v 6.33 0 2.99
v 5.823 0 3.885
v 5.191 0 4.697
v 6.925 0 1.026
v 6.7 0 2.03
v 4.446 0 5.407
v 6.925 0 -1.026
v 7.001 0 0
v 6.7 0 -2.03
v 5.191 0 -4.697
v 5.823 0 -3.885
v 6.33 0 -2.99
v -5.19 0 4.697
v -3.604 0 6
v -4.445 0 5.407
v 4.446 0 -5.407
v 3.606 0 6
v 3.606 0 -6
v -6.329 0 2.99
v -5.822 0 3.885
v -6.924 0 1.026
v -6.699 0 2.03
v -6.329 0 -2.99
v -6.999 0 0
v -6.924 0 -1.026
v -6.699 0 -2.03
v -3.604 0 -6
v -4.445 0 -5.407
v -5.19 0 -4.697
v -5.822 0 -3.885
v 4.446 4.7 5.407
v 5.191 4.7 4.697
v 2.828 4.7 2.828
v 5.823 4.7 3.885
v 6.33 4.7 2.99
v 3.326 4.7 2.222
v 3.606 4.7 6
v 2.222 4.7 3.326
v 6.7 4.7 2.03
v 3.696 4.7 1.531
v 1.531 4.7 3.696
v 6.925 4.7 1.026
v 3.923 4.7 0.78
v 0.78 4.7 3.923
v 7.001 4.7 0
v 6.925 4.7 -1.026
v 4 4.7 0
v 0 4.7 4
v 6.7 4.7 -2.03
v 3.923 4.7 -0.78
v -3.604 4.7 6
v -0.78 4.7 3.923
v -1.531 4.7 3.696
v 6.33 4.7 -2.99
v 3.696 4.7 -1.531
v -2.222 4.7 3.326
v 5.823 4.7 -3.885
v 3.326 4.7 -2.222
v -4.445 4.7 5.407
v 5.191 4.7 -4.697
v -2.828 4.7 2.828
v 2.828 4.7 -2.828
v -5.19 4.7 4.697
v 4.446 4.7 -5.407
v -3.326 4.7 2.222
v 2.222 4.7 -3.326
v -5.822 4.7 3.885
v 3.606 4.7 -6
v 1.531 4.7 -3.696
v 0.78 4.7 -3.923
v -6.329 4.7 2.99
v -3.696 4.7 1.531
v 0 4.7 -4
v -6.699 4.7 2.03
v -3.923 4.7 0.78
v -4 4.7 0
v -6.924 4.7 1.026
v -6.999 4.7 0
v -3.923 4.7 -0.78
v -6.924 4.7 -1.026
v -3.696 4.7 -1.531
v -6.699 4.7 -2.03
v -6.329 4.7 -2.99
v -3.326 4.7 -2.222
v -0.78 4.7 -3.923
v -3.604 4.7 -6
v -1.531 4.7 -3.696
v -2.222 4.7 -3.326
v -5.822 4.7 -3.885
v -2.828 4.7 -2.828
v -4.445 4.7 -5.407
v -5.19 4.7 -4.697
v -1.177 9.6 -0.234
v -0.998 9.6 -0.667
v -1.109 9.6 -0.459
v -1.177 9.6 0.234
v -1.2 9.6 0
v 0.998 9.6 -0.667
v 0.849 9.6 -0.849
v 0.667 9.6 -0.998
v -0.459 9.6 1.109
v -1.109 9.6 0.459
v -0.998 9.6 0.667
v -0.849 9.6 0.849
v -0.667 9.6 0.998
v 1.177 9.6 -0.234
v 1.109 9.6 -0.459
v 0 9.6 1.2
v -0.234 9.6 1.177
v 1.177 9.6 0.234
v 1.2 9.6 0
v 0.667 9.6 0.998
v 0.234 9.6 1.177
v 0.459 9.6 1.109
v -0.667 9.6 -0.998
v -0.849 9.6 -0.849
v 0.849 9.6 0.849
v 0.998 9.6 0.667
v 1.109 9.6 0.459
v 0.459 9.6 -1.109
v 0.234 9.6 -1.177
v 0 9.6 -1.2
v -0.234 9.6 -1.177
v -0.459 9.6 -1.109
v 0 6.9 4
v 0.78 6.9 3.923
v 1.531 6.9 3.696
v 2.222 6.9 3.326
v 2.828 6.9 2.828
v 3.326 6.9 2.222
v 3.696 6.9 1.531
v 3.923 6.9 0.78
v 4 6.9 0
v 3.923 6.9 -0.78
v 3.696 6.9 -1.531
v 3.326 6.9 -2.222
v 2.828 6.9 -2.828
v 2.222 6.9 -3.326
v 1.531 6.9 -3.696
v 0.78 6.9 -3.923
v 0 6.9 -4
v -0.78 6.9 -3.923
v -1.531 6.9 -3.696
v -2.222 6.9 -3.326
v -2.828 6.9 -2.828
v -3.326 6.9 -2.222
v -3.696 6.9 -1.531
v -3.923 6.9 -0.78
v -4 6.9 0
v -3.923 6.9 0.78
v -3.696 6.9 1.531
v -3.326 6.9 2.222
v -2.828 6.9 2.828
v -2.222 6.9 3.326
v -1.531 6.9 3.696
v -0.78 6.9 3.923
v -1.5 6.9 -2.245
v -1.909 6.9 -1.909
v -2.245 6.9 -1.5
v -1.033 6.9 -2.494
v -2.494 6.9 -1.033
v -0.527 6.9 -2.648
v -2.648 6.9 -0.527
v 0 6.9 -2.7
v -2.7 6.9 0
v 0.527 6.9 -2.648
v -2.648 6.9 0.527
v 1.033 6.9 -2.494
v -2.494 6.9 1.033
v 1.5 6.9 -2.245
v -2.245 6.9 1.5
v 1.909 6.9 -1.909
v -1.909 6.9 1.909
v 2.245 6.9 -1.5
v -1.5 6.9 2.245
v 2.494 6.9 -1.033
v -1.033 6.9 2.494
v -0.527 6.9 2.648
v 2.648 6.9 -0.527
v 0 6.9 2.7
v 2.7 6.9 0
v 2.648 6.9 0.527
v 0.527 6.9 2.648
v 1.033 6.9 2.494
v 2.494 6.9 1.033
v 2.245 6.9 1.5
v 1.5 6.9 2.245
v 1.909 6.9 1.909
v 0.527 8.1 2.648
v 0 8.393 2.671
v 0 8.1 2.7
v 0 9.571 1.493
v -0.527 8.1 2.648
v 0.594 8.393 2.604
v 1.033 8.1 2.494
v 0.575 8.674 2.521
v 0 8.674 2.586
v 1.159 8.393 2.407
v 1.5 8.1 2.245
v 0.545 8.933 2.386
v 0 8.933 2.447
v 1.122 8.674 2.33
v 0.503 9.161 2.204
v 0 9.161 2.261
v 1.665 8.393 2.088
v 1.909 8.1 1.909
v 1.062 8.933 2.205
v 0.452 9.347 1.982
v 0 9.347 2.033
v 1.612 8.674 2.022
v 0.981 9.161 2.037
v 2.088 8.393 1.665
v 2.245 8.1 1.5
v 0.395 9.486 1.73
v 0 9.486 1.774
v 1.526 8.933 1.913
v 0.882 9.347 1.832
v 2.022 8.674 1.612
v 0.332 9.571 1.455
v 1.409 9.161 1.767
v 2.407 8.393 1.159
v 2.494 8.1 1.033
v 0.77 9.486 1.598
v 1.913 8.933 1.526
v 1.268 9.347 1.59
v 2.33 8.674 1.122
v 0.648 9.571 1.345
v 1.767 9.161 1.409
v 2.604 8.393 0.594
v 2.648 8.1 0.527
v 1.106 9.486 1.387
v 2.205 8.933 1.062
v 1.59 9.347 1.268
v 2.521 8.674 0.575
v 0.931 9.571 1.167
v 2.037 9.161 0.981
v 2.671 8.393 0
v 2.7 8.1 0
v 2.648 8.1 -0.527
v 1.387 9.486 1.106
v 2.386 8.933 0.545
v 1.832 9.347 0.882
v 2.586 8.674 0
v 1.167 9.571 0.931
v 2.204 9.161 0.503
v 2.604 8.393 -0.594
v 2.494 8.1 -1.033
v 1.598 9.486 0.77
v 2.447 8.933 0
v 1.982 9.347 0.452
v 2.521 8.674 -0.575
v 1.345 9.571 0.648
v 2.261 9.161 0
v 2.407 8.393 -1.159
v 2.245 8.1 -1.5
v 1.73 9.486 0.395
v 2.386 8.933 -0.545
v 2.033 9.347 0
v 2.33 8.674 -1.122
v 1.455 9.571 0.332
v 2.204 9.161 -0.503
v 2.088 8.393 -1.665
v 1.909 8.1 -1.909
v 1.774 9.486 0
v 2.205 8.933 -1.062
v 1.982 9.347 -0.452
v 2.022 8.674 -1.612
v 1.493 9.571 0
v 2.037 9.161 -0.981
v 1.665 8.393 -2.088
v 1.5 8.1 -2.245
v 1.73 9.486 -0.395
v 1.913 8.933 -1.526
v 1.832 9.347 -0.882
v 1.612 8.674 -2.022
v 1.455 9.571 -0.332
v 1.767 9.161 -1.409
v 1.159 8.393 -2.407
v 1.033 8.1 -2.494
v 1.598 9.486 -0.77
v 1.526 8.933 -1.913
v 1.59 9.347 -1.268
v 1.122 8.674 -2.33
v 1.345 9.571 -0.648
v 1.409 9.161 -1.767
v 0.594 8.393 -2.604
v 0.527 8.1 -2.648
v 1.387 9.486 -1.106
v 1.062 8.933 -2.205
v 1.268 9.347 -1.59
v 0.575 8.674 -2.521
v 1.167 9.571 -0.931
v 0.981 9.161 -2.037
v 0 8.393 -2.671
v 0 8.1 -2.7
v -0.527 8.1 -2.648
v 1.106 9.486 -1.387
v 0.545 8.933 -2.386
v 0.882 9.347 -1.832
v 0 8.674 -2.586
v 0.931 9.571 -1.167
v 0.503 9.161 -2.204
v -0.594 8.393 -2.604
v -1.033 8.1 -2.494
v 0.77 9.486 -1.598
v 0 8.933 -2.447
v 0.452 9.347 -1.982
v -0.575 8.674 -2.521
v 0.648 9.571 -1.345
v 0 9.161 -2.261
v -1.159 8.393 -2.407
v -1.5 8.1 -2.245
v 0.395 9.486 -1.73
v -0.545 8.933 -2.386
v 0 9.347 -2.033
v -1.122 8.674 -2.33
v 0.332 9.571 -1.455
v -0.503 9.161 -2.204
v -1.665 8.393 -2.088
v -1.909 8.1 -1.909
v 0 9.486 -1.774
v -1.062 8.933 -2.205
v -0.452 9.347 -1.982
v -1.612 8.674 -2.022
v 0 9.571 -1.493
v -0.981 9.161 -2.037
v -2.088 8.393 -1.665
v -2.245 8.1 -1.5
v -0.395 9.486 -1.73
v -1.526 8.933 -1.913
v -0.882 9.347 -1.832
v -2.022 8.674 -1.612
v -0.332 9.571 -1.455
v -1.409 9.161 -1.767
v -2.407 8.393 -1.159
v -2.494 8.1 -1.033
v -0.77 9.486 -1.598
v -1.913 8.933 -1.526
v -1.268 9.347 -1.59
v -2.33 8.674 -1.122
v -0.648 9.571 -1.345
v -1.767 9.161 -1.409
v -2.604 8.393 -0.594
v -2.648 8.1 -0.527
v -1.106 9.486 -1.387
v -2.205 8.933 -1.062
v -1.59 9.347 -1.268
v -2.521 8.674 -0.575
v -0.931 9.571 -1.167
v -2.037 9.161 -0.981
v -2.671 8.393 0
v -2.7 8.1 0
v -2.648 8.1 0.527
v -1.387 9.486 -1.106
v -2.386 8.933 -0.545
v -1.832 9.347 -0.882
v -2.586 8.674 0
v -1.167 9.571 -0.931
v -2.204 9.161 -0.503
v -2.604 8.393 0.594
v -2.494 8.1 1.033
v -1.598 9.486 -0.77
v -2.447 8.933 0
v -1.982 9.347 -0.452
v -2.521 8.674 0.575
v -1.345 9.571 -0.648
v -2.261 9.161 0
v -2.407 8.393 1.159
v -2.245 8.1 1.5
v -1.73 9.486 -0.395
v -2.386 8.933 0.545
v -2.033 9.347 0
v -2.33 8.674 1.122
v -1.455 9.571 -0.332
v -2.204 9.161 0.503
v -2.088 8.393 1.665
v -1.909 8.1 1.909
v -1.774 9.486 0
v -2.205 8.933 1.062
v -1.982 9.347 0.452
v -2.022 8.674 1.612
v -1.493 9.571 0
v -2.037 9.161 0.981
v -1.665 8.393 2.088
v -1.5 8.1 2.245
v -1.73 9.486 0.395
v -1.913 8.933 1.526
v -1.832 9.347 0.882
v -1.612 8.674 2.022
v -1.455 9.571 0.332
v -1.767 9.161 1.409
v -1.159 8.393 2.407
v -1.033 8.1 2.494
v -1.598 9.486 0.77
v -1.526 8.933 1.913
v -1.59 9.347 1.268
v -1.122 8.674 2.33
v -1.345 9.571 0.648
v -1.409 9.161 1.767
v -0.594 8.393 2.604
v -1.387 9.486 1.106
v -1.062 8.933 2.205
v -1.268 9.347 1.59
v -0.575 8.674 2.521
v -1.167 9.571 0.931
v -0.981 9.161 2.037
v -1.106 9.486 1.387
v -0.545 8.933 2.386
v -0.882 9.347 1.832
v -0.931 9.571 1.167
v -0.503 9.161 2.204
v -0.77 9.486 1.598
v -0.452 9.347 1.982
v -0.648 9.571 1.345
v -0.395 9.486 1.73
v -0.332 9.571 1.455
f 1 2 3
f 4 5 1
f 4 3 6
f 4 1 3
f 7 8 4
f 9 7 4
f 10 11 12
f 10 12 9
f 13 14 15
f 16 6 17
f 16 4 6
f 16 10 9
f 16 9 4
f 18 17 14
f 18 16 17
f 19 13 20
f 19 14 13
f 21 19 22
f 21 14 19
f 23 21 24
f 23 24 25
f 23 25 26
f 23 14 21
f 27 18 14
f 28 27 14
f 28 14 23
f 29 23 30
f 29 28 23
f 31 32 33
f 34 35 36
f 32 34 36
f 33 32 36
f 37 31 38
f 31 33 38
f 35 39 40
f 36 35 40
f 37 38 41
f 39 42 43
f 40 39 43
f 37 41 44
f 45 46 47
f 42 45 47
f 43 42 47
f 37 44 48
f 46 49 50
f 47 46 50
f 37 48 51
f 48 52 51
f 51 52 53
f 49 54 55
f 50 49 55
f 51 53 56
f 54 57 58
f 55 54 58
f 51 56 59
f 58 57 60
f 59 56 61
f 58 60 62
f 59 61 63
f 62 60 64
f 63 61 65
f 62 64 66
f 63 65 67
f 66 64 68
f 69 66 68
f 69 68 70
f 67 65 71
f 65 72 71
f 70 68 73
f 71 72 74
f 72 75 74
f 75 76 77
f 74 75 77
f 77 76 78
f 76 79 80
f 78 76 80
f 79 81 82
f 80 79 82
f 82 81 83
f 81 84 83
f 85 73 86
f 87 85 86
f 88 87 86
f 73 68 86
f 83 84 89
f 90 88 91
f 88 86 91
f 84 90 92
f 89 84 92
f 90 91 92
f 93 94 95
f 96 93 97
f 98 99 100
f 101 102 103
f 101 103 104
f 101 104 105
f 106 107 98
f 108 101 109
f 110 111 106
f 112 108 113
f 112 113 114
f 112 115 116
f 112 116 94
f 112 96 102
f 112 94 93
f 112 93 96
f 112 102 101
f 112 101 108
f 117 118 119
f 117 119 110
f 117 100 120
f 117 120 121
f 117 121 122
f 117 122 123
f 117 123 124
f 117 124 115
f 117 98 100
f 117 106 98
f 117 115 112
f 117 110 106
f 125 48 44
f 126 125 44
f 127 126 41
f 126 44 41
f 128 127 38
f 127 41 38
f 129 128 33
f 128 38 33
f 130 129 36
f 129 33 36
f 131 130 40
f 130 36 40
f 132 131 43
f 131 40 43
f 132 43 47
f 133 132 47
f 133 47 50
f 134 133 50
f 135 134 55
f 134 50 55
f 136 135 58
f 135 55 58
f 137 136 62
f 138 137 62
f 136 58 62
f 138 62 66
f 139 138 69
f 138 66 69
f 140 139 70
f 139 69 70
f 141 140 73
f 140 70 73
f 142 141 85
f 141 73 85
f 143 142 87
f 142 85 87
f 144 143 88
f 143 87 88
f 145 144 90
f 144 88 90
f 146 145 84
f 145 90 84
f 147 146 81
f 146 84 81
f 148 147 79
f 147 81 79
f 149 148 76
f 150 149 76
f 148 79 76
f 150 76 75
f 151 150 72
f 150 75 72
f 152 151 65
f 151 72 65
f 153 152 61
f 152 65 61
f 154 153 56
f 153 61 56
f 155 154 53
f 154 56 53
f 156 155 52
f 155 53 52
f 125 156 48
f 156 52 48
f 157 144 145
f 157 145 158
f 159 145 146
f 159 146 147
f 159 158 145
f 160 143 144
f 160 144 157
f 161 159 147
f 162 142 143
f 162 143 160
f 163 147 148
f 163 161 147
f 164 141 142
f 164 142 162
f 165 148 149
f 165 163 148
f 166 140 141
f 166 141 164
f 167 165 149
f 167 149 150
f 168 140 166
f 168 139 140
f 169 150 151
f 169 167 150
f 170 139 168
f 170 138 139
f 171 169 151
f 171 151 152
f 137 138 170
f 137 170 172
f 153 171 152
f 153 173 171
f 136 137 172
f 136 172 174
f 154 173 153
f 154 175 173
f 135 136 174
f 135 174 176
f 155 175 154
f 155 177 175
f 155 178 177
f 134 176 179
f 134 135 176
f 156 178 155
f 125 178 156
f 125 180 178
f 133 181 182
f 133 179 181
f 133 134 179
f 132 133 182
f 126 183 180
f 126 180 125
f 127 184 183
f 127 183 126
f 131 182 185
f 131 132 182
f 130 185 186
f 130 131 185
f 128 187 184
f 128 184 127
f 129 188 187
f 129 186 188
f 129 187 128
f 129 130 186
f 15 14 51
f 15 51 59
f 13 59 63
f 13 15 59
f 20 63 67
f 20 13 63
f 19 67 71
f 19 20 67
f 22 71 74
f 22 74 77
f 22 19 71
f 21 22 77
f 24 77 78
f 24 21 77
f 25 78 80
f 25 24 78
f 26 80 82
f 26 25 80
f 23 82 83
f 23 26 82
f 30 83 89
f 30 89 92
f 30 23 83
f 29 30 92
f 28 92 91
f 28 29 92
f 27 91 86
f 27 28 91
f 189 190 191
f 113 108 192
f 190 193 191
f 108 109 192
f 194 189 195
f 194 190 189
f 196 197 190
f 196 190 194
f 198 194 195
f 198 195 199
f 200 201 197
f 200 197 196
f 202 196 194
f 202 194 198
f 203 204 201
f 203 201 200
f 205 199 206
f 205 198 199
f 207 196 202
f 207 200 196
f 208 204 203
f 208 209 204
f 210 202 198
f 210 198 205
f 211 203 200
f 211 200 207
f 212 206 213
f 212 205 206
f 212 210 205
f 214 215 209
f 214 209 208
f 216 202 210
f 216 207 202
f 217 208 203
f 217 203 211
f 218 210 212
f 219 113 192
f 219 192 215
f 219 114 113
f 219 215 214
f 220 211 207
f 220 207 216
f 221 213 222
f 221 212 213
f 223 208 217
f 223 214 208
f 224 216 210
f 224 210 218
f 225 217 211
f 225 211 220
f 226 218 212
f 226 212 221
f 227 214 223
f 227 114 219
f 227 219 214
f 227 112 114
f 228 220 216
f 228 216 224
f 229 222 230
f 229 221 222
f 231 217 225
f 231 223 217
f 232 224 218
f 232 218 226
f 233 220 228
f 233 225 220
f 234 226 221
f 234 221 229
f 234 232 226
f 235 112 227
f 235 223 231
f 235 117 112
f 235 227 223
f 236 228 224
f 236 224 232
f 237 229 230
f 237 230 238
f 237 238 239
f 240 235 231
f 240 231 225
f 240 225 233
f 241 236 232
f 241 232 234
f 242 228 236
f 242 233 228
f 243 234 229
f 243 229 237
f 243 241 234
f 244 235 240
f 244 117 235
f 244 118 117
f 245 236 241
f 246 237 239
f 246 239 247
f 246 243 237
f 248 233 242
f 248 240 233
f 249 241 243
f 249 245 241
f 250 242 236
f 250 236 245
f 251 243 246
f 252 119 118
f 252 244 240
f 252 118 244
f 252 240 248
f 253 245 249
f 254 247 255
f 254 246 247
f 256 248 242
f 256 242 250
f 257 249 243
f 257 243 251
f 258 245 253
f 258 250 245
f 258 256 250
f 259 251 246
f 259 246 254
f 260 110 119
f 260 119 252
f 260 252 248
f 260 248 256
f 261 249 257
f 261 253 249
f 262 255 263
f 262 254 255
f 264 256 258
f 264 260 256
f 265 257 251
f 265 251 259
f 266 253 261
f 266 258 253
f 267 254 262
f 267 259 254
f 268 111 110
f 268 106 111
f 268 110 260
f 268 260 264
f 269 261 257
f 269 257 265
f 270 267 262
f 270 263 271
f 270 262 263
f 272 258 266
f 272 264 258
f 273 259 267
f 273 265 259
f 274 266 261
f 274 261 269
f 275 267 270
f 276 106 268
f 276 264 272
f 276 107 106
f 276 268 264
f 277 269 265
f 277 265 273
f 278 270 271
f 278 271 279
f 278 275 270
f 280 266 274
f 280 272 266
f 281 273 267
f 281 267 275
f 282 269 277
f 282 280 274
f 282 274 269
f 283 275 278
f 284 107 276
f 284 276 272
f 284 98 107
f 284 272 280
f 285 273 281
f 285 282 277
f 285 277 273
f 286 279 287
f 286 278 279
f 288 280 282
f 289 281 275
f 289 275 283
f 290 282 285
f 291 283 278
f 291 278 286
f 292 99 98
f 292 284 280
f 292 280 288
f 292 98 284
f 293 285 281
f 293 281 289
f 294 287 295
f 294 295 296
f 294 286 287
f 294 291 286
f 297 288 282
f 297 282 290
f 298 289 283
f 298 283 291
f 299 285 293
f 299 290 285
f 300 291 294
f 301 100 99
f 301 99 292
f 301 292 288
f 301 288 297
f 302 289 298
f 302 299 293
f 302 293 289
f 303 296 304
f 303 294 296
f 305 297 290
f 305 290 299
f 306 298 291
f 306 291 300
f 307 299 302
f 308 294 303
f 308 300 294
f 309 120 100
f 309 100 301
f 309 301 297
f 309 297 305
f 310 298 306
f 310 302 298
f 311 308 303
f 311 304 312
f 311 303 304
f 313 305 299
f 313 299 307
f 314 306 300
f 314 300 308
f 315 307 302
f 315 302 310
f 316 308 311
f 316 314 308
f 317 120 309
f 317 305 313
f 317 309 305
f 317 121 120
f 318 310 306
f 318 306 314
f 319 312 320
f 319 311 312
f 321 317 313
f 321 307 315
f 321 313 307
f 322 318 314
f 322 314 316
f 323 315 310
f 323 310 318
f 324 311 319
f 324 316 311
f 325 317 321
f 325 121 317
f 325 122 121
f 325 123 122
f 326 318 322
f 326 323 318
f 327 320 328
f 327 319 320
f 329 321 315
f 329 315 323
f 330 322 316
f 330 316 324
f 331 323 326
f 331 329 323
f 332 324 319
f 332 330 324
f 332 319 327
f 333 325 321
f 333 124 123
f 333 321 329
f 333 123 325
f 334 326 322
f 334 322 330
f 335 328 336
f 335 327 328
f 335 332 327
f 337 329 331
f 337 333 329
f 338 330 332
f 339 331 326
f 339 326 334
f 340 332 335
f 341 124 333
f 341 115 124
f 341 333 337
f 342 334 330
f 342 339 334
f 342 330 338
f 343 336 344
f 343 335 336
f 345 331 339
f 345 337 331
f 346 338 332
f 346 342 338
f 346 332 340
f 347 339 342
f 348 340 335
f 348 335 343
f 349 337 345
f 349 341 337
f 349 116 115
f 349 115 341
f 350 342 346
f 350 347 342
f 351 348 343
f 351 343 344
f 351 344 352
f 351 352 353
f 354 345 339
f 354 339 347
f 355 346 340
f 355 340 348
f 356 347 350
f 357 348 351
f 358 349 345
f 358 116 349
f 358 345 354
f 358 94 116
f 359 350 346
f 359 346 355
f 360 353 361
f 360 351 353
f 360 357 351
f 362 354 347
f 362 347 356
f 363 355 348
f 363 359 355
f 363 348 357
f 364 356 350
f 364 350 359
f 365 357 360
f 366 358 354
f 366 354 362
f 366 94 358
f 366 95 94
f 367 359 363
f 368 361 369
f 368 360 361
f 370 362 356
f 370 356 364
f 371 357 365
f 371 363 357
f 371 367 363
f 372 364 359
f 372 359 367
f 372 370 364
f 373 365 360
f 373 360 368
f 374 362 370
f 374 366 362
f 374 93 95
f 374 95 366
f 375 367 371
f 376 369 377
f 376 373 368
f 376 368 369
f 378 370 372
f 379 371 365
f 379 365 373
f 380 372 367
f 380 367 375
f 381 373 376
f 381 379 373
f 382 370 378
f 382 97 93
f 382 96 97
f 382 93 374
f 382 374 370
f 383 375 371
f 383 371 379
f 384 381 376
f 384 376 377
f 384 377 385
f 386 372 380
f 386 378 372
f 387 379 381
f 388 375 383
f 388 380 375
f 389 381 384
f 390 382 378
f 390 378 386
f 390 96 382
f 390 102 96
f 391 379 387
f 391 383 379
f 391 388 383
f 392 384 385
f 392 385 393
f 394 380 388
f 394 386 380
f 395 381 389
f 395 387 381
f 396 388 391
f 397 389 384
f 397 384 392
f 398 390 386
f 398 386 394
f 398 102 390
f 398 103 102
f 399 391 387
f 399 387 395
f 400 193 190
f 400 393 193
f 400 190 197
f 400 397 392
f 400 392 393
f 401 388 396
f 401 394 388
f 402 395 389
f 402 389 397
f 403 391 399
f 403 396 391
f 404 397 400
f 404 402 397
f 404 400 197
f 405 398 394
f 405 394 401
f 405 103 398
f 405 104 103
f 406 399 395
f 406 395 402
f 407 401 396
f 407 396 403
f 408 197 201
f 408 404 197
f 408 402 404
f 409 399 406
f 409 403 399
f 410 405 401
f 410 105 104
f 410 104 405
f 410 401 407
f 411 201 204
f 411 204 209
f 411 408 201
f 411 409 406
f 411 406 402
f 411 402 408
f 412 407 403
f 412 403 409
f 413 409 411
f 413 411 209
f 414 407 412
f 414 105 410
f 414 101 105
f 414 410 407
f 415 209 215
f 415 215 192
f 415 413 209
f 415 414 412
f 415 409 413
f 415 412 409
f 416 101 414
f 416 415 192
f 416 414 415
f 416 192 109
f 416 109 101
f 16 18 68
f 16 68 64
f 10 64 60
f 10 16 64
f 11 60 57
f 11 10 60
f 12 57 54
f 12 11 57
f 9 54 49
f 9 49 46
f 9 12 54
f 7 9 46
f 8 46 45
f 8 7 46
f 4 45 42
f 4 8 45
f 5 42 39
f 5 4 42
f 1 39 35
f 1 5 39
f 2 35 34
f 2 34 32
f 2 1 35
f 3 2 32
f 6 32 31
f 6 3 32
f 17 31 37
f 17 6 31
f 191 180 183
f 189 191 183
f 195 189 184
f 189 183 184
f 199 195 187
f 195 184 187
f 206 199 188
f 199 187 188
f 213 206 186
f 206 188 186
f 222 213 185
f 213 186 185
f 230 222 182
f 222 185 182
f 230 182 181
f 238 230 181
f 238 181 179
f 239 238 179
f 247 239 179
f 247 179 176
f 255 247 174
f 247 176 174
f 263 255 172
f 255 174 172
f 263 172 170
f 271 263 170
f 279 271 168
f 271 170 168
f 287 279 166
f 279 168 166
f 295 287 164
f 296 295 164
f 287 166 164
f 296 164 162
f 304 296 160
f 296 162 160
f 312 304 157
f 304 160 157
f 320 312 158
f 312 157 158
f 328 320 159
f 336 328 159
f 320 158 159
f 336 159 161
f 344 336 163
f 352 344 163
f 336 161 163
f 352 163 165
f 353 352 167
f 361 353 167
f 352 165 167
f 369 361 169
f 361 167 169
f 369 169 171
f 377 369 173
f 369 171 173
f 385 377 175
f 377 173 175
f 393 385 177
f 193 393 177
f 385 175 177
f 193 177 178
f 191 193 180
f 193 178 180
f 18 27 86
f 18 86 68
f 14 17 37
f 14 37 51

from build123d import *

# Parameters (mm, degrees)
BOSS_EXTRUDE1_DEPTH = 4.7
SKETCH2_R           = 4
BOSS_EXTRUDE2_DEPTH = 2.2
SKETCH3_R           = 2.7
BOSS_EXTRUDE3_DEPTH = 2.7
FILLET1_R           = 1.5


with BuildPart() as part:
    # Sketch1 → Boss-Extrude1 (new body)
    with BuildSketch(Plane(origin=(0, 0, 0), x_dir=(1, 0, 0), z_dir=(0, 1, 0))):
        with BuildLine():
            Line((-3.60441458, 6), (3.60558542, 6))
            ThreePointArc((3.60558542, 6), (7.00058542, 0), (3.60558542, -6))
            Line((3.60558542, -6), (-3.60441458, -6))
            ThreePointArc((-3.60441458, -6), (-6.99941458, 0), (-3.60441458, 6))
        make_face()
    extrude(amount=BOSS_EXTRUDE1_DEPTH)

    # Sketch2 → Boss-Extrude2 (add)
    with BuildSketch(Plane(origin=(0, 4.7, 0), x_dir=(1, 0, 0), z_dir=(0, 1, 0))):
        with Locations(Location((0, 0, 0), (0, 0, 270))):
            Circle(SKETCH2_R)
    extrude(amount=BOSS_EXTRUDE2_DEPTH)

    # Sketch3 → Boss-Extrude3 (add)
    with BuildSketch(Plane(origin=(0, 6.9, 0), x_dir=(1, 0, 0), z_dir=(0, 1, 0))):
        with Locations(Location((0, 0, 0), (0, 0, 270))):
            Circle(SKETCH3_R)
    extrude(amount=BOSS_EXTRUDE3_DEPTH)

    # Fillet1
    fillet1_edges = [part.edges().sort_by_distance(p)[0] for p in [
        (0, 9.6, -2.7),
    ]]
    fillet(fillet1_edges, radius=FILLET1_R)


solid = part.part
